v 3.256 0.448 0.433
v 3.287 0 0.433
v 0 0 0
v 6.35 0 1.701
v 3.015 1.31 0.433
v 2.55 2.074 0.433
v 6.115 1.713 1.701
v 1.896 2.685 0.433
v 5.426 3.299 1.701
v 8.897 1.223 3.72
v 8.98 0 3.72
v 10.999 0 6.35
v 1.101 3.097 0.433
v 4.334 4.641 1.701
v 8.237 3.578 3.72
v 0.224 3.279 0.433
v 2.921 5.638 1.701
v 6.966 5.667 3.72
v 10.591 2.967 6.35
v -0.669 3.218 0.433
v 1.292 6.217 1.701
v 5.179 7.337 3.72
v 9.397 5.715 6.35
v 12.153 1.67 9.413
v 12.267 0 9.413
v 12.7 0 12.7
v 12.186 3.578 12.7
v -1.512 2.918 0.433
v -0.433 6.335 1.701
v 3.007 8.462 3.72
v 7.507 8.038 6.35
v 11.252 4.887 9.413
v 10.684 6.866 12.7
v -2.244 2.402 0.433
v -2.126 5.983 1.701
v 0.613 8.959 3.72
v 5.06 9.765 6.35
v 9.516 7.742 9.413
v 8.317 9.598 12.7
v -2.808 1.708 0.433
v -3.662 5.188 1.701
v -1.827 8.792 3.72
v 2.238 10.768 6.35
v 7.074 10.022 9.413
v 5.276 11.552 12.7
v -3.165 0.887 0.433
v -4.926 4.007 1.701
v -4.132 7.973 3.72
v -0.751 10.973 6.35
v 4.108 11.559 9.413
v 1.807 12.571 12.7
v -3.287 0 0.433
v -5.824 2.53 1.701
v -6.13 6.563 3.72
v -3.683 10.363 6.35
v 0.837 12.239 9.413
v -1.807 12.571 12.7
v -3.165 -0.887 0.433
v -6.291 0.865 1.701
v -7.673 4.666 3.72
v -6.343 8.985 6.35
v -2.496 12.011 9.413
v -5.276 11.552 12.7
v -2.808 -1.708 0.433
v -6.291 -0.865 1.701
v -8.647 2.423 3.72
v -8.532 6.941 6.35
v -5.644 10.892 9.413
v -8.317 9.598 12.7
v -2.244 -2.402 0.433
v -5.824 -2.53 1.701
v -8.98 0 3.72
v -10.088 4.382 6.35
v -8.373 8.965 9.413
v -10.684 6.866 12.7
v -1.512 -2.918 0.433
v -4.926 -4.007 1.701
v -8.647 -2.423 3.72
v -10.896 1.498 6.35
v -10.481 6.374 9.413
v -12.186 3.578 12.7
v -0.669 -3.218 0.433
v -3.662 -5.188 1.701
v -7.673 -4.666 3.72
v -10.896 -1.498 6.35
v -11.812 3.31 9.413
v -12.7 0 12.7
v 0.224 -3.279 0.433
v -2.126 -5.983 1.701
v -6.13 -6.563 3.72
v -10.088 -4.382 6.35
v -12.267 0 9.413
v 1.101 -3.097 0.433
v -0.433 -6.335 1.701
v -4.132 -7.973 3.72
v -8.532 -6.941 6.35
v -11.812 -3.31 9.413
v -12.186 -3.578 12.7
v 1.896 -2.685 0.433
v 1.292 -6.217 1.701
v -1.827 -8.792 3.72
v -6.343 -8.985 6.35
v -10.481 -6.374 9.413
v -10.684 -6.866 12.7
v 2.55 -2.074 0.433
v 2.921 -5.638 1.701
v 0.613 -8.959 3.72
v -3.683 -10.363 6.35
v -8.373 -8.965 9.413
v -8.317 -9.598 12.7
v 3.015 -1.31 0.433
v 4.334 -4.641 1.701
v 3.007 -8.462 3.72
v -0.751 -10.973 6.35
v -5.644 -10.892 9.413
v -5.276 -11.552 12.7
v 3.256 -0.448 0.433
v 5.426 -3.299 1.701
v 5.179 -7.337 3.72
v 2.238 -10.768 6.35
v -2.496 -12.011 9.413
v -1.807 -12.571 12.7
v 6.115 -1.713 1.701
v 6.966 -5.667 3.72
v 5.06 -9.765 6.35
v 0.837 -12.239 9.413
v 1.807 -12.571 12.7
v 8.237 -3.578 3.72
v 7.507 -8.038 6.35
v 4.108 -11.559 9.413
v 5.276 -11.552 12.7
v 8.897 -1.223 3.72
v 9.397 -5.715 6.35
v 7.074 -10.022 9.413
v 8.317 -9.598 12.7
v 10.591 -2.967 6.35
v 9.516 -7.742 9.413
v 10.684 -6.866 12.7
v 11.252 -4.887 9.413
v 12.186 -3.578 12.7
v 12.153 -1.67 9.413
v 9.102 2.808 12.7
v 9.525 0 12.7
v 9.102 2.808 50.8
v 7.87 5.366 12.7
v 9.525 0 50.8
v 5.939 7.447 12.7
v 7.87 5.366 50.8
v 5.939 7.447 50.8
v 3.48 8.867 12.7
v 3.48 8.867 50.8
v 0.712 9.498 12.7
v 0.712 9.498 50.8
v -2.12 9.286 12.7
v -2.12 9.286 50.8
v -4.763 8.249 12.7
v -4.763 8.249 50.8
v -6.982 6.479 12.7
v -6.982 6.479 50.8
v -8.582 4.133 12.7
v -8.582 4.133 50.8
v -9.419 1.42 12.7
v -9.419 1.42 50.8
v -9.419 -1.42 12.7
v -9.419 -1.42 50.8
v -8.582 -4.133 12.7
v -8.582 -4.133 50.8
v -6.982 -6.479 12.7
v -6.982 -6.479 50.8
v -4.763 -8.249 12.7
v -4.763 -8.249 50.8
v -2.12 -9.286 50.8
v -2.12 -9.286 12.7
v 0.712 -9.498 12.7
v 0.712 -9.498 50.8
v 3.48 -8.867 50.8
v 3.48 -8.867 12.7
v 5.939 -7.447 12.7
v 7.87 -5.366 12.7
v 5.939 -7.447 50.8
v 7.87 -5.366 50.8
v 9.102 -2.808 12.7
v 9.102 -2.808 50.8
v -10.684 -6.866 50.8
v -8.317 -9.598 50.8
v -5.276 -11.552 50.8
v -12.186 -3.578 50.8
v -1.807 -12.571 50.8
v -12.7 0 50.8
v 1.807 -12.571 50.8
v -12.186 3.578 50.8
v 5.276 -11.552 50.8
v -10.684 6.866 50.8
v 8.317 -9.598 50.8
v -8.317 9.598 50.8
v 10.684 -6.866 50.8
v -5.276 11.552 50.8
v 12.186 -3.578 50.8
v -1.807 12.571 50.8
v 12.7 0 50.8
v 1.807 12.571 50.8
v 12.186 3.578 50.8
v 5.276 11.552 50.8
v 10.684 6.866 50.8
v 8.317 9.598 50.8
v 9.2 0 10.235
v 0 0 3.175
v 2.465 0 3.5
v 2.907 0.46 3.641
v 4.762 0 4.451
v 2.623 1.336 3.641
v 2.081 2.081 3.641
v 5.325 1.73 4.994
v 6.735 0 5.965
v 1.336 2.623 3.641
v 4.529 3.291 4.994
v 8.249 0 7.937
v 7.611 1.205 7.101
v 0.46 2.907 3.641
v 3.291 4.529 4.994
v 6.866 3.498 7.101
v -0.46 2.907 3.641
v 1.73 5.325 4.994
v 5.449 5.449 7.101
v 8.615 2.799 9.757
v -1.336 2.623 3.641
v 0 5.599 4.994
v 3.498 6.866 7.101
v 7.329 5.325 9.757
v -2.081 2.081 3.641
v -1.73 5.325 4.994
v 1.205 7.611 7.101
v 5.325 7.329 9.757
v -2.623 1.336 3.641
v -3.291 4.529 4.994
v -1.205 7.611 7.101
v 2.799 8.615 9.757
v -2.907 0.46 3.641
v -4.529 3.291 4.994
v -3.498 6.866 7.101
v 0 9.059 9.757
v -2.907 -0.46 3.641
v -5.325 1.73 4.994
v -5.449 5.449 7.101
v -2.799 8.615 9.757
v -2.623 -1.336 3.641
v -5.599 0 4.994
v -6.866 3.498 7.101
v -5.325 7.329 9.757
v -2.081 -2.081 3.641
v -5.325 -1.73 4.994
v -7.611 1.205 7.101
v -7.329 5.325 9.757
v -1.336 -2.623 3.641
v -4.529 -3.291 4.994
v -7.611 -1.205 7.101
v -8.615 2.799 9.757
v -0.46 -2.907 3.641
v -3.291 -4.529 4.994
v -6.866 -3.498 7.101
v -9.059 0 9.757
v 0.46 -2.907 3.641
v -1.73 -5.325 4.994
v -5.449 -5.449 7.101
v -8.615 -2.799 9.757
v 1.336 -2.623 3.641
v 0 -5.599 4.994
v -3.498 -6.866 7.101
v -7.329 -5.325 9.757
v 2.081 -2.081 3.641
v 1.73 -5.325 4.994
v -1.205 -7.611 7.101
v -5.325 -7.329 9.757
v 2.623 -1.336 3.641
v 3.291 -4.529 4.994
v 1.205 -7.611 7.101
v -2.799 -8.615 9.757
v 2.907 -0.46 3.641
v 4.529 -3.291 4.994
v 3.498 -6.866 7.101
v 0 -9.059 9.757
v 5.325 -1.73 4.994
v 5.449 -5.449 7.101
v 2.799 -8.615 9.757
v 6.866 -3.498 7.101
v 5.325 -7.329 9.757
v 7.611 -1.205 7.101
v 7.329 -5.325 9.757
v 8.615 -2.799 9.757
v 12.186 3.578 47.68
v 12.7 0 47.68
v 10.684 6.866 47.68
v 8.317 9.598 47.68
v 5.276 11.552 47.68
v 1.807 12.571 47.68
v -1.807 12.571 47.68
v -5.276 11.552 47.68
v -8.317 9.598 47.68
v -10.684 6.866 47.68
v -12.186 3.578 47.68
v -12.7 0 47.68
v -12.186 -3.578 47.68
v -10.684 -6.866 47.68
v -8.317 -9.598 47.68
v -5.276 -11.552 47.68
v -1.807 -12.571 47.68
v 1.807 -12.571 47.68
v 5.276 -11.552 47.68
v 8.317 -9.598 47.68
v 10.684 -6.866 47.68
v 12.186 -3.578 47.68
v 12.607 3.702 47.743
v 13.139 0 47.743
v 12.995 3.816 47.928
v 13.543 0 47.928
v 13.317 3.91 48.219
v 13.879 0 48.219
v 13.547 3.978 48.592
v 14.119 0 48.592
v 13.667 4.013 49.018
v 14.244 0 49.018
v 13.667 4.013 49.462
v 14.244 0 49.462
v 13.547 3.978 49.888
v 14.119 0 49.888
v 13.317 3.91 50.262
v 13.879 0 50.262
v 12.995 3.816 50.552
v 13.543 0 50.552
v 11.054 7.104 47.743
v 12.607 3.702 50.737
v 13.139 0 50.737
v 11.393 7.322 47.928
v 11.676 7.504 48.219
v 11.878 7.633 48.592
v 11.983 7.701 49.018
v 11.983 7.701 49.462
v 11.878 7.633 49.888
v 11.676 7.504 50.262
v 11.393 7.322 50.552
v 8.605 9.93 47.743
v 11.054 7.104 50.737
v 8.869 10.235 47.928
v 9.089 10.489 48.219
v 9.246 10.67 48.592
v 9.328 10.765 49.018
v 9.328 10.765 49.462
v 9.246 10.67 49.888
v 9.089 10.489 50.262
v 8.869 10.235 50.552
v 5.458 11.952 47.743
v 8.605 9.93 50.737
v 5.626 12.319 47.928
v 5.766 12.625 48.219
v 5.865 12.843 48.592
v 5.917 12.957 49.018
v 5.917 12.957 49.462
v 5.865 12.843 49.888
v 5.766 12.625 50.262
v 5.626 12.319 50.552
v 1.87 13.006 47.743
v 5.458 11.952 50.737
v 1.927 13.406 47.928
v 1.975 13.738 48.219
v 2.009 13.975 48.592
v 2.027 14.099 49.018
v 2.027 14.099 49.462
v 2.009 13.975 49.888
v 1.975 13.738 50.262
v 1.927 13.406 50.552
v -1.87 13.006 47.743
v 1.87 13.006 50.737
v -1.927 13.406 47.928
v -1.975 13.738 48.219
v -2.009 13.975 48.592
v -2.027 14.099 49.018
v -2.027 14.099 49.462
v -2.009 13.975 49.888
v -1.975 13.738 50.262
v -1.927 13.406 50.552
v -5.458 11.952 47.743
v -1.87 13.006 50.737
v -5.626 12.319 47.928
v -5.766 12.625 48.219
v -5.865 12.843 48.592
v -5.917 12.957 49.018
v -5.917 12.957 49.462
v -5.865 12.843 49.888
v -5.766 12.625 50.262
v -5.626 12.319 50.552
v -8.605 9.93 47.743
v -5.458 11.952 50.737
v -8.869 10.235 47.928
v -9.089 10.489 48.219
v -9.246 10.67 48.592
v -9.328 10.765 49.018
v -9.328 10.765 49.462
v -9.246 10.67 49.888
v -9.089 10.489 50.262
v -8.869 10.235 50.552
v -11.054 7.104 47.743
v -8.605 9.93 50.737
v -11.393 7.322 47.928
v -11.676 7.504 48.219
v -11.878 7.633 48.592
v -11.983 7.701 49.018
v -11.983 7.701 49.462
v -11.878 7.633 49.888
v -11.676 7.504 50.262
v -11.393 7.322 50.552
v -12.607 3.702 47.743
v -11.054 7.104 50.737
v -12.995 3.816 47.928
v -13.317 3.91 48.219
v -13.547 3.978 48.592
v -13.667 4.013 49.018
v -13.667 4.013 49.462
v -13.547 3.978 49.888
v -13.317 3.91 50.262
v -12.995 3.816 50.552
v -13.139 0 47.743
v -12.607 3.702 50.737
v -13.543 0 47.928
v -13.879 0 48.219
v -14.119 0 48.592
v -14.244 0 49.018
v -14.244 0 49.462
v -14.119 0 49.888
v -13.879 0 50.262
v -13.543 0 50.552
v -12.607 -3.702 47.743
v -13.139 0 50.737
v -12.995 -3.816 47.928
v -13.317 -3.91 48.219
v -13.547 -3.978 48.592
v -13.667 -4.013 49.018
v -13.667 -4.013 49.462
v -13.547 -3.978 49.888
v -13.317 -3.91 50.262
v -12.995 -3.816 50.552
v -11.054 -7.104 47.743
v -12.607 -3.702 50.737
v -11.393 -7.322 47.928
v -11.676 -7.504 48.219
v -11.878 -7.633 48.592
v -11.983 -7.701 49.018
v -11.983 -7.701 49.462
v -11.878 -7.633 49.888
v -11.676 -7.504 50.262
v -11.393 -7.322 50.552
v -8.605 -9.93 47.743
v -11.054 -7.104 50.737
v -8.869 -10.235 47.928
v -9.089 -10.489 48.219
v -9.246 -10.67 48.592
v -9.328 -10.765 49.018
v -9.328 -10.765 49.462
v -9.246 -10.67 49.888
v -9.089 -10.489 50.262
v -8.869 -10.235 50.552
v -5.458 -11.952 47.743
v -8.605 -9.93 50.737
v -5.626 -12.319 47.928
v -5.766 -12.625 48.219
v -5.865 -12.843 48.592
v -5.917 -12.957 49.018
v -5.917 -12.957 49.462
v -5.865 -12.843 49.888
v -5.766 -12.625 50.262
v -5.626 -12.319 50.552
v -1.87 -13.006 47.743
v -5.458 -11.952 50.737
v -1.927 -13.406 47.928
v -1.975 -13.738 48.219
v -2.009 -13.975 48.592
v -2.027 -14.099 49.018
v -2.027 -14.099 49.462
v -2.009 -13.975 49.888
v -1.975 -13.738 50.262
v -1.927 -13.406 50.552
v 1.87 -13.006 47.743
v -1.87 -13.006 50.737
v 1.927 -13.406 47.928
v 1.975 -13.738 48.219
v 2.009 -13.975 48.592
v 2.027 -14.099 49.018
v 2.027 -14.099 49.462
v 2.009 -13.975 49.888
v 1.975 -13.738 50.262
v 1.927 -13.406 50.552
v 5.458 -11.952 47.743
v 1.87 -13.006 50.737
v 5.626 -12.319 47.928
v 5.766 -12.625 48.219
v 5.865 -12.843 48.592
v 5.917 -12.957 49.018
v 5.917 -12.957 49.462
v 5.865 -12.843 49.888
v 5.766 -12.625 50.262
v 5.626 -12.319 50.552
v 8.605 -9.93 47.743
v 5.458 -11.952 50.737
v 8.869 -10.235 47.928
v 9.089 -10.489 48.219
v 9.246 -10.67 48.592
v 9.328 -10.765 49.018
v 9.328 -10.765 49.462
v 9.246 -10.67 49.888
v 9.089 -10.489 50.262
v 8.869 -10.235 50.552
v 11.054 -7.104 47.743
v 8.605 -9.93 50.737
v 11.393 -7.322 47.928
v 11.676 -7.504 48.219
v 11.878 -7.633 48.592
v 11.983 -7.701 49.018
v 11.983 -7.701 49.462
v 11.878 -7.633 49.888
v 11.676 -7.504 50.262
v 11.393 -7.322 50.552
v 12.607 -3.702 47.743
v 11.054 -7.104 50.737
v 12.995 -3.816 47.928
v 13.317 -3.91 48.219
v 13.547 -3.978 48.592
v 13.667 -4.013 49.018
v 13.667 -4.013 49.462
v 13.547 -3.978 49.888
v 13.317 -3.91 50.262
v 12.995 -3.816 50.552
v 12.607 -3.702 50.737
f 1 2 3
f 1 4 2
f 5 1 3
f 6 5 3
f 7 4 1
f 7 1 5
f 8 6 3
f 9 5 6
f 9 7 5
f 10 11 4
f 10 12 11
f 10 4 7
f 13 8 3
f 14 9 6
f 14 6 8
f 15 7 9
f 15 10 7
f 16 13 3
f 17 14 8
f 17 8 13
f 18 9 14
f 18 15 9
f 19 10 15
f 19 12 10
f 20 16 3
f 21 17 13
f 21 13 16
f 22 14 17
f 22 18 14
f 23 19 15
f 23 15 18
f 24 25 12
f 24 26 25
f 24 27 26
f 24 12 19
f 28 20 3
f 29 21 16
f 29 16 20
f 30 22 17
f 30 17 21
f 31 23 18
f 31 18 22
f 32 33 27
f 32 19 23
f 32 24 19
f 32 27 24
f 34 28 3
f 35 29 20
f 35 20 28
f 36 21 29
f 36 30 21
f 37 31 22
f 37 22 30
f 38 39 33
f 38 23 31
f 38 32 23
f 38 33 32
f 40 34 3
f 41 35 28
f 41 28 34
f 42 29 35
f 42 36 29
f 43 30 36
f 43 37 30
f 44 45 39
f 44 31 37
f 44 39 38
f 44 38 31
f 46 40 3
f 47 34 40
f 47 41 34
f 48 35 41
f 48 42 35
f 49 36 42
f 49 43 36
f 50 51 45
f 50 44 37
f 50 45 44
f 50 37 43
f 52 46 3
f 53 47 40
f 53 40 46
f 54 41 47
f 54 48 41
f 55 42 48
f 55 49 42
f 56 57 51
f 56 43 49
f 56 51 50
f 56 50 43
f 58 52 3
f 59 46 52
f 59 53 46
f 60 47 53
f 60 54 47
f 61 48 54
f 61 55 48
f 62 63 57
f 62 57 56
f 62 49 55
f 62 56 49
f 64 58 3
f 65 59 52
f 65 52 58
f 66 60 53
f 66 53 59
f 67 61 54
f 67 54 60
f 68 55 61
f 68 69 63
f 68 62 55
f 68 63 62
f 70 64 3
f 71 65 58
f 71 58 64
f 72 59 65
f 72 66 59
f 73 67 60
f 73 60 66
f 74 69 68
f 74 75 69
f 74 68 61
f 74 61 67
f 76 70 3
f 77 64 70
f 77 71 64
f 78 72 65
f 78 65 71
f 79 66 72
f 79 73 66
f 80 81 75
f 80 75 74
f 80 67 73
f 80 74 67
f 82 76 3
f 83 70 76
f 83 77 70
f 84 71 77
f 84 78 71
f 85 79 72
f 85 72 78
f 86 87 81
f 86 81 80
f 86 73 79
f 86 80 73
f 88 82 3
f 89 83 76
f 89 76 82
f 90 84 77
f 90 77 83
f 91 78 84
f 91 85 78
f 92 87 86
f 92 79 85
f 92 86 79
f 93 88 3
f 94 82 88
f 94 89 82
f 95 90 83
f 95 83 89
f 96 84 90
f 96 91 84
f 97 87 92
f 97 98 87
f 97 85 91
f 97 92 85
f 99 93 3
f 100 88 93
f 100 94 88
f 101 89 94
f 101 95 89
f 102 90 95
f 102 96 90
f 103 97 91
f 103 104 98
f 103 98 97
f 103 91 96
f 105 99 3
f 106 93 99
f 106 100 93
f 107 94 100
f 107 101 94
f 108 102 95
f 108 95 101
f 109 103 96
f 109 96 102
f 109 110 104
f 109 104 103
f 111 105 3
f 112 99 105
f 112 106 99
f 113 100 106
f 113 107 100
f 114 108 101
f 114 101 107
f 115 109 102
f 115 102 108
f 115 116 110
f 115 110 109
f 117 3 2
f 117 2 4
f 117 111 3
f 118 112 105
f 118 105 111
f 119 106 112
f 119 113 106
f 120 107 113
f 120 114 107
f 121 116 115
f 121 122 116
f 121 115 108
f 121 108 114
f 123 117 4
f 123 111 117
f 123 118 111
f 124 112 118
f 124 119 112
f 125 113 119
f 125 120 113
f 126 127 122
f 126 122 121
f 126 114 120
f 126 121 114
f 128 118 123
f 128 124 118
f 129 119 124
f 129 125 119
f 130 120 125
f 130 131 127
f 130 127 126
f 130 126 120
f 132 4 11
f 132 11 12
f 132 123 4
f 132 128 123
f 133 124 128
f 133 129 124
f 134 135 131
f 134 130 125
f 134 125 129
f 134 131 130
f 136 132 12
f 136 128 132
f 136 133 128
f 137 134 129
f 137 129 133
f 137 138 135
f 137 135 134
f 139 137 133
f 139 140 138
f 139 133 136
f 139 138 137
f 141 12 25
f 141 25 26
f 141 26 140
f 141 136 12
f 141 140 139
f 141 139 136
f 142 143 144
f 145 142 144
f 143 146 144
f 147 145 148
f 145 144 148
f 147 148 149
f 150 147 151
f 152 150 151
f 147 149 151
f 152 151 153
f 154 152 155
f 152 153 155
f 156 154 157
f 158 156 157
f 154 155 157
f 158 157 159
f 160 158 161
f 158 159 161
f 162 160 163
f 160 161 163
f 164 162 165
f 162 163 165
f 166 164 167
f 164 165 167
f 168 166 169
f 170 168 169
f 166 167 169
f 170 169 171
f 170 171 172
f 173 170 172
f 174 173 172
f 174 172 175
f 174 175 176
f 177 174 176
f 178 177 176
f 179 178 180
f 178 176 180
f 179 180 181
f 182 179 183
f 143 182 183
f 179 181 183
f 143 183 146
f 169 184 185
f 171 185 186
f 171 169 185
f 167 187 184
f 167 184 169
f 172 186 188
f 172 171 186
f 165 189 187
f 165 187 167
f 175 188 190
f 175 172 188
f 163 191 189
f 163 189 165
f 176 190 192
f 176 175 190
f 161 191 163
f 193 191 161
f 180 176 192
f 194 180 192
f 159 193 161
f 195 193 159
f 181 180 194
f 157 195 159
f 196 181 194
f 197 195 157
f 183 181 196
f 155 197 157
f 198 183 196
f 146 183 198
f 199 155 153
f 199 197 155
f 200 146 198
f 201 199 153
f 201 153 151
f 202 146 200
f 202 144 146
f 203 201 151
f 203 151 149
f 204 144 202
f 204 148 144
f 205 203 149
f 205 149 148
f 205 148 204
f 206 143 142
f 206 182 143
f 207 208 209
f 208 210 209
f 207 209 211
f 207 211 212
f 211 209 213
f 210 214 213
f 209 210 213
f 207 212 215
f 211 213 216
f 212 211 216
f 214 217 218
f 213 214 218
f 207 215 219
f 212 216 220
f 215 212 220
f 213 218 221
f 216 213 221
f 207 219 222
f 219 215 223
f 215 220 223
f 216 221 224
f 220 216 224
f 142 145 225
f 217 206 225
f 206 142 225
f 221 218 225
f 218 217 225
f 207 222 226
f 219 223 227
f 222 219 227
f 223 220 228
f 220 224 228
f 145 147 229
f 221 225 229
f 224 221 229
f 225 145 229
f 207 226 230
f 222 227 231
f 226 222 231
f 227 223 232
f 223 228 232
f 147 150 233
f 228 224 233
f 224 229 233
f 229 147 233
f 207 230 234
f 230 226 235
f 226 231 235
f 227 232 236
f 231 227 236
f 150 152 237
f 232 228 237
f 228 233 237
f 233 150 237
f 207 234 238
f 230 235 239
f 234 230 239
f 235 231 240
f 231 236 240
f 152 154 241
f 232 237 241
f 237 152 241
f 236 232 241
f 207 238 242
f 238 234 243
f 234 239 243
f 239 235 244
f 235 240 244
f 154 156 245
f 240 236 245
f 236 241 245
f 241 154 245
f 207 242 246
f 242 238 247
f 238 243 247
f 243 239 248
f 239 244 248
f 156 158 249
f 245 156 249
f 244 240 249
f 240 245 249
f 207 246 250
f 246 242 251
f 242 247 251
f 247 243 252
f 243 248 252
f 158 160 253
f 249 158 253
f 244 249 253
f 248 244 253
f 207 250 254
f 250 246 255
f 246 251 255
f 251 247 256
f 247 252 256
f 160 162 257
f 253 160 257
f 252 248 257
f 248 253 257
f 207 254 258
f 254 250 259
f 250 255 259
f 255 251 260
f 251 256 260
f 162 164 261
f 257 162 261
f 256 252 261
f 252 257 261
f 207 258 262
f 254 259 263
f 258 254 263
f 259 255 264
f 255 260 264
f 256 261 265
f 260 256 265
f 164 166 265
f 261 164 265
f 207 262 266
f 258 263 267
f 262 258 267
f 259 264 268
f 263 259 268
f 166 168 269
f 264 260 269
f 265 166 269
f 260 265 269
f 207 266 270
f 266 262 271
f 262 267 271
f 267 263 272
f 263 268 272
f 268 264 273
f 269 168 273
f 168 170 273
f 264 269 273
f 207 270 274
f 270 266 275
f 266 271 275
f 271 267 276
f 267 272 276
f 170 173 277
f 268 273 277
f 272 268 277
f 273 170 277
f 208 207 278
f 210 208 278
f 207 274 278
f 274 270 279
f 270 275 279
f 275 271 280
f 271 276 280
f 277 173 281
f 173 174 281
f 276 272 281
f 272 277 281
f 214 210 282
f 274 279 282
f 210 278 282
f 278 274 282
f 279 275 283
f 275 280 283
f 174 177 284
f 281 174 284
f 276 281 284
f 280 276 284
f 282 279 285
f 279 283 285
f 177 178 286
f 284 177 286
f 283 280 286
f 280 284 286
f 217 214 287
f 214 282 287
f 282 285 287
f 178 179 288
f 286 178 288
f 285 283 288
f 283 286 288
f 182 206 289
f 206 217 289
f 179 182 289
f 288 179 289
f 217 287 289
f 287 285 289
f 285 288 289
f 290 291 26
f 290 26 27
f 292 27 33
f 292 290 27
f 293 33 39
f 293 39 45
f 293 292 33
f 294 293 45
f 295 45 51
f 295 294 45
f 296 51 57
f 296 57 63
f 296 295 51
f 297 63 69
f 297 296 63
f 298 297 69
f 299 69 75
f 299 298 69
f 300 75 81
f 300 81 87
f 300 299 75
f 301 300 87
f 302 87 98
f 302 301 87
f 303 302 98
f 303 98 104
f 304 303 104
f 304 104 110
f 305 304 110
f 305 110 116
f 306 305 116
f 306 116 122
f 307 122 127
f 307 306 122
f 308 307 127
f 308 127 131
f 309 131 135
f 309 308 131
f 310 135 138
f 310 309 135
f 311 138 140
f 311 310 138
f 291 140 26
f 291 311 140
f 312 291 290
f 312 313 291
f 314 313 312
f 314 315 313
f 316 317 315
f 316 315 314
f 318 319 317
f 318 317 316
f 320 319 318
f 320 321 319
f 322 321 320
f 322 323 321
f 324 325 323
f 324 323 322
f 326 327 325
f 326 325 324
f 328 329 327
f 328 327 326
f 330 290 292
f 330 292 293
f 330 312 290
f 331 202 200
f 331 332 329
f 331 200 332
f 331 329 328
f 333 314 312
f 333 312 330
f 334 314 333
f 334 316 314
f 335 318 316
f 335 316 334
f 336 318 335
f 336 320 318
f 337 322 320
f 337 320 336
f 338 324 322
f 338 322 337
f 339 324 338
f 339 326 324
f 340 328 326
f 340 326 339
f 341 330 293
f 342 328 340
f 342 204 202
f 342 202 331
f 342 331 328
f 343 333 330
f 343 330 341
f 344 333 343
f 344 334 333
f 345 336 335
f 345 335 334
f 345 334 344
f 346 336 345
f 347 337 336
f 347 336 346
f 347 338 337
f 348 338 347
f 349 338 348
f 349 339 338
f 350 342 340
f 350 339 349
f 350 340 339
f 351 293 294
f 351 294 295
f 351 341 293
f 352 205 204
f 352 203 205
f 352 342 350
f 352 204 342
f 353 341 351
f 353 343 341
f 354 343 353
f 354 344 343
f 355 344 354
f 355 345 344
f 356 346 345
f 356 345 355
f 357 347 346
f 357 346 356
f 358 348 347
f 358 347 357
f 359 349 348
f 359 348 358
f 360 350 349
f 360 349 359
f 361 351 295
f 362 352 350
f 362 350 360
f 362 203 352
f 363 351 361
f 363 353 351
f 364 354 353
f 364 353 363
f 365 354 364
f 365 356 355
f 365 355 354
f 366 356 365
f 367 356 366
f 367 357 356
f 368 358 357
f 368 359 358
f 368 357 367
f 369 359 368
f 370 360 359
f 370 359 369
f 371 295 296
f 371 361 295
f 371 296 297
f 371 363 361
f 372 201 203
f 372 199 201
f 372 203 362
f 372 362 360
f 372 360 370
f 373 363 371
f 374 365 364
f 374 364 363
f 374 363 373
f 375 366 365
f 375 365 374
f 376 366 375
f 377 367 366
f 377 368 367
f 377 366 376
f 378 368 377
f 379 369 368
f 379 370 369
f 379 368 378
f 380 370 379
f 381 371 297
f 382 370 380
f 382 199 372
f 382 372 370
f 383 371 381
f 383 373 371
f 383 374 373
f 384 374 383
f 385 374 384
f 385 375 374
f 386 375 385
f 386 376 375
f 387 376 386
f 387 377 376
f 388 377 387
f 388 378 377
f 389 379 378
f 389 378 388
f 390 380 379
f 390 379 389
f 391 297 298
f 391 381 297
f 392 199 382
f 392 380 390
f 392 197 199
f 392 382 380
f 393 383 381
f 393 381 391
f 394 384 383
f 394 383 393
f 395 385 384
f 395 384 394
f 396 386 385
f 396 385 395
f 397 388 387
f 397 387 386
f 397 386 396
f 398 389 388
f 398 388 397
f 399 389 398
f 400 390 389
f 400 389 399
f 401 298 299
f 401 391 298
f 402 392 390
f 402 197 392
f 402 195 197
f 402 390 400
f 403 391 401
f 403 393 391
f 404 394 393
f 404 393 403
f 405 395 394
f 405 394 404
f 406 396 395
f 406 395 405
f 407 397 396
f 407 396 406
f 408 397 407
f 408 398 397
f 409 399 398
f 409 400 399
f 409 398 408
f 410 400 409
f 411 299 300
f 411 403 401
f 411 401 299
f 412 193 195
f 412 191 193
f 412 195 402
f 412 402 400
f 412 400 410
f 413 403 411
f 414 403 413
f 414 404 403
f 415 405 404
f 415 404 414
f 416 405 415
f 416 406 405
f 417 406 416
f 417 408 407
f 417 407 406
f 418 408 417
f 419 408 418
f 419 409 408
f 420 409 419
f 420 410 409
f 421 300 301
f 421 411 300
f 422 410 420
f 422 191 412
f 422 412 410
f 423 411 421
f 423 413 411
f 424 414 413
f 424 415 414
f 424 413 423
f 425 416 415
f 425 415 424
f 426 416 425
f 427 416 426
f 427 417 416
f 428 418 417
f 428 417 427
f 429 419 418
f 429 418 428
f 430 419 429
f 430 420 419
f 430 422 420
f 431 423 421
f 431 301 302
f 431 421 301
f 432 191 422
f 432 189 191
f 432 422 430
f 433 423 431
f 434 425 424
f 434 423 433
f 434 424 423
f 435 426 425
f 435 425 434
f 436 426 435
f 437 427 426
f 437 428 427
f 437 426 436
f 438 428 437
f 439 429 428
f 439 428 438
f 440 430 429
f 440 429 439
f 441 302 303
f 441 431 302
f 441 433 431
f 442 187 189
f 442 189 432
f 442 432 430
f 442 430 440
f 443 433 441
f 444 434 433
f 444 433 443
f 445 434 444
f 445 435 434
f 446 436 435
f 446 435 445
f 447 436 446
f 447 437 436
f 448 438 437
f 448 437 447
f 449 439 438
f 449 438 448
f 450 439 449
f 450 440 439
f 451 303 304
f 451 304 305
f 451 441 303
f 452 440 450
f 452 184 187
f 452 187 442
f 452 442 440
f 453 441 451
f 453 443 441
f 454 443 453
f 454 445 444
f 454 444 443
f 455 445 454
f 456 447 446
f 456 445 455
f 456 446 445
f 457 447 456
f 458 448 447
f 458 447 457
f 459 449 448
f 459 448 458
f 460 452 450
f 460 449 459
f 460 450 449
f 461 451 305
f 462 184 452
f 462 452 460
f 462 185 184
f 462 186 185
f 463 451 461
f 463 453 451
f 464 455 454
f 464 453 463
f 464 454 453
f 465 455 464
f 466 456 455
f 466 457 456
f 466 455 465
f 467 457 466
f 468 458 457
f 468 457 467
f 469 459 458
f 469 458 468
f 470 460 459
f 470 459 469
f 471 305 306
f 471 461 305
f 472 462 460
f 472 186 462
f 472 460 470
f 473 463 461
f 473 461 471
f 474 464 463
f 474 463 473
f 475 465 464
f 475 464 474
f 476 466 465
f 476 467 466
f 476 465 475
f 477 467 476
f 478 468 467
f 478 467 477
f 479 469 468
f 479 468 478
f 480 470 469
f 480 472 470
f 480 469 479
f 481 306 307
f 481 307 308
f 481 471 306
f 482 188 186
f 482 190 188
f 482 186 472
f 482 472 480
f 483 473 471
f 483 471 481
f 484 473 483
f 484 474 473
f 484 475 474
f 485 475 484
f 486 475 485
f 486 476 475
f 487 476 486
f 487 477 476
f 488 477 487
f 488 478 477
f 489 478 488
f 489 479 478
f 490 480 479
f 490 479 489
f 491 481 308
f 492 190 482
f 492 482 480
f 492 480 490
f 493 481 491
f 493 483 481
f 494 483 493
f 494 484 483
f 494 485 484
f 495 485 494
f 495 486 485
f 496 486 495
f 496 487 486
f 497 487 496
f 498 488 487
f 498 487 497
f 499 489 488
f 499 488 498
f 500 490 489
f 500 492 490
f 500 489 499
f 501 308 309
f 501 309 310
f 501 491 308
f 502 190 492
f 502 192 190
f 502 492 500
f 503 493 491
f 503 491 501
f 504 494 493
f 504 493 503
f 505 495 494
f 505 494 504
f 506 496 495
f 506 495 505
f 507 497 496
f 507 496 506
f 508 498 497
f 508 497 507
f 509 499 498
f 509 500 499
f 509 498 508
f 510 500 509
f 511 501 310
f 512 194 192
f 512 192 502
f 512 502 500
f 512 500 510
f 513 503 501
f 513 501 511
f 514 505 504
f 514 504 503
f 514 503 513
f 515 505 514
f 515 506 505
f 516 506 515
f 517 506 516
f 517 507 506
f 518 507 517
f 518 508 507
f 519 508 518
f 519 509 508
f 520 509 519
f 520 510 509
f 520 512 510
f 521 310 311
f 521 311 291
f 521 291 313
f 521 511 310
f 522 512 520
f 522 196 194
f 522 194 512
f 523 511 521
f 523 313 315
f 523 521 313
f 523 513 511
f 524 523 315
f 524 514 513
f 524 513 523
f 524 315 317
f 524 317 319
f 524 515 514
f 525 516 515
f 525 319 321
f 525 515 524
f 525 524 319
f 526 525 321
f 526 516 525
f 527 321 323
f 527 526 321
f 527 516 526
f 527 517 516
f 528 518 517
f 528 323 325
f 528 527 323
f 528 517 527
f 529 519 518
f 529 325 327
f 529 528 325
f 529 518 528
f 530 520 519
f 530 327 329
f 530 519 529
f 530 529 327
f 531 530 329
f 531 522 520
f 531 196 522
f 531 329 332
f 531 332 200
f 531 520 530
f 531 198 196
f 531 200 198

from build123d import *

# Parameters (mm, degrees)
F2_R = 12.7
F3_T = 3.175


# Not quite as in the source:
# - a shell that OpenCascade refuses in one call is made with other operations: the cavity is built on its own and cut out


with BuildPart() as f1:
    # F0 (on Front) → F1 (revolve)
    with BuildSketch(Plane.XZ):
        Polygon((0, 50.8), (0, 0), (12.7, 0), (12.7, 47.6801507175), (12.7, 50.8), align=None)
        with BuildLine():
            ThreePointArc((12.7, 47.6801507175), (14.2599246413, 49.2400753587), (12.7, 50.8))
            Line((12.7, 50.8), (12.7, 47.6801507175))
        make_face()
    revolve(axis=Axis((0, 0, 25.4), (0, 0, 1)))

    # F2
    f2_edges = [f1.edges().sort_by_distance(p)[0] for p in [
        (-12.7, 0, 0),
    ]]
    fillet(f2_edges, radius=F2_R)

    # F3: shell of thickness 3.175, made by hand


with BuildPart() as f3_core1:
    # F3_t2: copy of F1
    add(f1.part)

    # the walls: a layer under each face that stays
    f3_faces = [f3_core1.faces().sort_by_distance(p)[0] for p in [
        (-12.7, 0, 30.1900753587),
        (-8.9802561211, 0, 3.7197438789),
    ]]
    thicken(f3_faces, amount=-F3_T, mode=Mode.SUBTRACT)

    # F3_s3 → F3_t4 (revolve, cut)
    with BuildSketch(Plane.XZ):
        Polygon((12.73175, 47.6484007175), (9.525, 47.6801507175), (9.525, 50.8551507175), (12.7, 50.8551507175), align=None)
    revolve(axis=Axis((0, 0, 47.6801507175), (0, 0, 1)), mode=Mode.SUBTRACT)


with BuildPart() as f1_1:
    add(f1.part)

    # what is left inside the walls is the cavity
    f3_cavity = [f3_core1.part.solids().sort_by_distance(p)[0] for p in [
        (-9.49325, 0, 25.4),
    ]]
    add(f3_cavity, mode=Mode.SUBTRACT)


solid = f1_1.part
